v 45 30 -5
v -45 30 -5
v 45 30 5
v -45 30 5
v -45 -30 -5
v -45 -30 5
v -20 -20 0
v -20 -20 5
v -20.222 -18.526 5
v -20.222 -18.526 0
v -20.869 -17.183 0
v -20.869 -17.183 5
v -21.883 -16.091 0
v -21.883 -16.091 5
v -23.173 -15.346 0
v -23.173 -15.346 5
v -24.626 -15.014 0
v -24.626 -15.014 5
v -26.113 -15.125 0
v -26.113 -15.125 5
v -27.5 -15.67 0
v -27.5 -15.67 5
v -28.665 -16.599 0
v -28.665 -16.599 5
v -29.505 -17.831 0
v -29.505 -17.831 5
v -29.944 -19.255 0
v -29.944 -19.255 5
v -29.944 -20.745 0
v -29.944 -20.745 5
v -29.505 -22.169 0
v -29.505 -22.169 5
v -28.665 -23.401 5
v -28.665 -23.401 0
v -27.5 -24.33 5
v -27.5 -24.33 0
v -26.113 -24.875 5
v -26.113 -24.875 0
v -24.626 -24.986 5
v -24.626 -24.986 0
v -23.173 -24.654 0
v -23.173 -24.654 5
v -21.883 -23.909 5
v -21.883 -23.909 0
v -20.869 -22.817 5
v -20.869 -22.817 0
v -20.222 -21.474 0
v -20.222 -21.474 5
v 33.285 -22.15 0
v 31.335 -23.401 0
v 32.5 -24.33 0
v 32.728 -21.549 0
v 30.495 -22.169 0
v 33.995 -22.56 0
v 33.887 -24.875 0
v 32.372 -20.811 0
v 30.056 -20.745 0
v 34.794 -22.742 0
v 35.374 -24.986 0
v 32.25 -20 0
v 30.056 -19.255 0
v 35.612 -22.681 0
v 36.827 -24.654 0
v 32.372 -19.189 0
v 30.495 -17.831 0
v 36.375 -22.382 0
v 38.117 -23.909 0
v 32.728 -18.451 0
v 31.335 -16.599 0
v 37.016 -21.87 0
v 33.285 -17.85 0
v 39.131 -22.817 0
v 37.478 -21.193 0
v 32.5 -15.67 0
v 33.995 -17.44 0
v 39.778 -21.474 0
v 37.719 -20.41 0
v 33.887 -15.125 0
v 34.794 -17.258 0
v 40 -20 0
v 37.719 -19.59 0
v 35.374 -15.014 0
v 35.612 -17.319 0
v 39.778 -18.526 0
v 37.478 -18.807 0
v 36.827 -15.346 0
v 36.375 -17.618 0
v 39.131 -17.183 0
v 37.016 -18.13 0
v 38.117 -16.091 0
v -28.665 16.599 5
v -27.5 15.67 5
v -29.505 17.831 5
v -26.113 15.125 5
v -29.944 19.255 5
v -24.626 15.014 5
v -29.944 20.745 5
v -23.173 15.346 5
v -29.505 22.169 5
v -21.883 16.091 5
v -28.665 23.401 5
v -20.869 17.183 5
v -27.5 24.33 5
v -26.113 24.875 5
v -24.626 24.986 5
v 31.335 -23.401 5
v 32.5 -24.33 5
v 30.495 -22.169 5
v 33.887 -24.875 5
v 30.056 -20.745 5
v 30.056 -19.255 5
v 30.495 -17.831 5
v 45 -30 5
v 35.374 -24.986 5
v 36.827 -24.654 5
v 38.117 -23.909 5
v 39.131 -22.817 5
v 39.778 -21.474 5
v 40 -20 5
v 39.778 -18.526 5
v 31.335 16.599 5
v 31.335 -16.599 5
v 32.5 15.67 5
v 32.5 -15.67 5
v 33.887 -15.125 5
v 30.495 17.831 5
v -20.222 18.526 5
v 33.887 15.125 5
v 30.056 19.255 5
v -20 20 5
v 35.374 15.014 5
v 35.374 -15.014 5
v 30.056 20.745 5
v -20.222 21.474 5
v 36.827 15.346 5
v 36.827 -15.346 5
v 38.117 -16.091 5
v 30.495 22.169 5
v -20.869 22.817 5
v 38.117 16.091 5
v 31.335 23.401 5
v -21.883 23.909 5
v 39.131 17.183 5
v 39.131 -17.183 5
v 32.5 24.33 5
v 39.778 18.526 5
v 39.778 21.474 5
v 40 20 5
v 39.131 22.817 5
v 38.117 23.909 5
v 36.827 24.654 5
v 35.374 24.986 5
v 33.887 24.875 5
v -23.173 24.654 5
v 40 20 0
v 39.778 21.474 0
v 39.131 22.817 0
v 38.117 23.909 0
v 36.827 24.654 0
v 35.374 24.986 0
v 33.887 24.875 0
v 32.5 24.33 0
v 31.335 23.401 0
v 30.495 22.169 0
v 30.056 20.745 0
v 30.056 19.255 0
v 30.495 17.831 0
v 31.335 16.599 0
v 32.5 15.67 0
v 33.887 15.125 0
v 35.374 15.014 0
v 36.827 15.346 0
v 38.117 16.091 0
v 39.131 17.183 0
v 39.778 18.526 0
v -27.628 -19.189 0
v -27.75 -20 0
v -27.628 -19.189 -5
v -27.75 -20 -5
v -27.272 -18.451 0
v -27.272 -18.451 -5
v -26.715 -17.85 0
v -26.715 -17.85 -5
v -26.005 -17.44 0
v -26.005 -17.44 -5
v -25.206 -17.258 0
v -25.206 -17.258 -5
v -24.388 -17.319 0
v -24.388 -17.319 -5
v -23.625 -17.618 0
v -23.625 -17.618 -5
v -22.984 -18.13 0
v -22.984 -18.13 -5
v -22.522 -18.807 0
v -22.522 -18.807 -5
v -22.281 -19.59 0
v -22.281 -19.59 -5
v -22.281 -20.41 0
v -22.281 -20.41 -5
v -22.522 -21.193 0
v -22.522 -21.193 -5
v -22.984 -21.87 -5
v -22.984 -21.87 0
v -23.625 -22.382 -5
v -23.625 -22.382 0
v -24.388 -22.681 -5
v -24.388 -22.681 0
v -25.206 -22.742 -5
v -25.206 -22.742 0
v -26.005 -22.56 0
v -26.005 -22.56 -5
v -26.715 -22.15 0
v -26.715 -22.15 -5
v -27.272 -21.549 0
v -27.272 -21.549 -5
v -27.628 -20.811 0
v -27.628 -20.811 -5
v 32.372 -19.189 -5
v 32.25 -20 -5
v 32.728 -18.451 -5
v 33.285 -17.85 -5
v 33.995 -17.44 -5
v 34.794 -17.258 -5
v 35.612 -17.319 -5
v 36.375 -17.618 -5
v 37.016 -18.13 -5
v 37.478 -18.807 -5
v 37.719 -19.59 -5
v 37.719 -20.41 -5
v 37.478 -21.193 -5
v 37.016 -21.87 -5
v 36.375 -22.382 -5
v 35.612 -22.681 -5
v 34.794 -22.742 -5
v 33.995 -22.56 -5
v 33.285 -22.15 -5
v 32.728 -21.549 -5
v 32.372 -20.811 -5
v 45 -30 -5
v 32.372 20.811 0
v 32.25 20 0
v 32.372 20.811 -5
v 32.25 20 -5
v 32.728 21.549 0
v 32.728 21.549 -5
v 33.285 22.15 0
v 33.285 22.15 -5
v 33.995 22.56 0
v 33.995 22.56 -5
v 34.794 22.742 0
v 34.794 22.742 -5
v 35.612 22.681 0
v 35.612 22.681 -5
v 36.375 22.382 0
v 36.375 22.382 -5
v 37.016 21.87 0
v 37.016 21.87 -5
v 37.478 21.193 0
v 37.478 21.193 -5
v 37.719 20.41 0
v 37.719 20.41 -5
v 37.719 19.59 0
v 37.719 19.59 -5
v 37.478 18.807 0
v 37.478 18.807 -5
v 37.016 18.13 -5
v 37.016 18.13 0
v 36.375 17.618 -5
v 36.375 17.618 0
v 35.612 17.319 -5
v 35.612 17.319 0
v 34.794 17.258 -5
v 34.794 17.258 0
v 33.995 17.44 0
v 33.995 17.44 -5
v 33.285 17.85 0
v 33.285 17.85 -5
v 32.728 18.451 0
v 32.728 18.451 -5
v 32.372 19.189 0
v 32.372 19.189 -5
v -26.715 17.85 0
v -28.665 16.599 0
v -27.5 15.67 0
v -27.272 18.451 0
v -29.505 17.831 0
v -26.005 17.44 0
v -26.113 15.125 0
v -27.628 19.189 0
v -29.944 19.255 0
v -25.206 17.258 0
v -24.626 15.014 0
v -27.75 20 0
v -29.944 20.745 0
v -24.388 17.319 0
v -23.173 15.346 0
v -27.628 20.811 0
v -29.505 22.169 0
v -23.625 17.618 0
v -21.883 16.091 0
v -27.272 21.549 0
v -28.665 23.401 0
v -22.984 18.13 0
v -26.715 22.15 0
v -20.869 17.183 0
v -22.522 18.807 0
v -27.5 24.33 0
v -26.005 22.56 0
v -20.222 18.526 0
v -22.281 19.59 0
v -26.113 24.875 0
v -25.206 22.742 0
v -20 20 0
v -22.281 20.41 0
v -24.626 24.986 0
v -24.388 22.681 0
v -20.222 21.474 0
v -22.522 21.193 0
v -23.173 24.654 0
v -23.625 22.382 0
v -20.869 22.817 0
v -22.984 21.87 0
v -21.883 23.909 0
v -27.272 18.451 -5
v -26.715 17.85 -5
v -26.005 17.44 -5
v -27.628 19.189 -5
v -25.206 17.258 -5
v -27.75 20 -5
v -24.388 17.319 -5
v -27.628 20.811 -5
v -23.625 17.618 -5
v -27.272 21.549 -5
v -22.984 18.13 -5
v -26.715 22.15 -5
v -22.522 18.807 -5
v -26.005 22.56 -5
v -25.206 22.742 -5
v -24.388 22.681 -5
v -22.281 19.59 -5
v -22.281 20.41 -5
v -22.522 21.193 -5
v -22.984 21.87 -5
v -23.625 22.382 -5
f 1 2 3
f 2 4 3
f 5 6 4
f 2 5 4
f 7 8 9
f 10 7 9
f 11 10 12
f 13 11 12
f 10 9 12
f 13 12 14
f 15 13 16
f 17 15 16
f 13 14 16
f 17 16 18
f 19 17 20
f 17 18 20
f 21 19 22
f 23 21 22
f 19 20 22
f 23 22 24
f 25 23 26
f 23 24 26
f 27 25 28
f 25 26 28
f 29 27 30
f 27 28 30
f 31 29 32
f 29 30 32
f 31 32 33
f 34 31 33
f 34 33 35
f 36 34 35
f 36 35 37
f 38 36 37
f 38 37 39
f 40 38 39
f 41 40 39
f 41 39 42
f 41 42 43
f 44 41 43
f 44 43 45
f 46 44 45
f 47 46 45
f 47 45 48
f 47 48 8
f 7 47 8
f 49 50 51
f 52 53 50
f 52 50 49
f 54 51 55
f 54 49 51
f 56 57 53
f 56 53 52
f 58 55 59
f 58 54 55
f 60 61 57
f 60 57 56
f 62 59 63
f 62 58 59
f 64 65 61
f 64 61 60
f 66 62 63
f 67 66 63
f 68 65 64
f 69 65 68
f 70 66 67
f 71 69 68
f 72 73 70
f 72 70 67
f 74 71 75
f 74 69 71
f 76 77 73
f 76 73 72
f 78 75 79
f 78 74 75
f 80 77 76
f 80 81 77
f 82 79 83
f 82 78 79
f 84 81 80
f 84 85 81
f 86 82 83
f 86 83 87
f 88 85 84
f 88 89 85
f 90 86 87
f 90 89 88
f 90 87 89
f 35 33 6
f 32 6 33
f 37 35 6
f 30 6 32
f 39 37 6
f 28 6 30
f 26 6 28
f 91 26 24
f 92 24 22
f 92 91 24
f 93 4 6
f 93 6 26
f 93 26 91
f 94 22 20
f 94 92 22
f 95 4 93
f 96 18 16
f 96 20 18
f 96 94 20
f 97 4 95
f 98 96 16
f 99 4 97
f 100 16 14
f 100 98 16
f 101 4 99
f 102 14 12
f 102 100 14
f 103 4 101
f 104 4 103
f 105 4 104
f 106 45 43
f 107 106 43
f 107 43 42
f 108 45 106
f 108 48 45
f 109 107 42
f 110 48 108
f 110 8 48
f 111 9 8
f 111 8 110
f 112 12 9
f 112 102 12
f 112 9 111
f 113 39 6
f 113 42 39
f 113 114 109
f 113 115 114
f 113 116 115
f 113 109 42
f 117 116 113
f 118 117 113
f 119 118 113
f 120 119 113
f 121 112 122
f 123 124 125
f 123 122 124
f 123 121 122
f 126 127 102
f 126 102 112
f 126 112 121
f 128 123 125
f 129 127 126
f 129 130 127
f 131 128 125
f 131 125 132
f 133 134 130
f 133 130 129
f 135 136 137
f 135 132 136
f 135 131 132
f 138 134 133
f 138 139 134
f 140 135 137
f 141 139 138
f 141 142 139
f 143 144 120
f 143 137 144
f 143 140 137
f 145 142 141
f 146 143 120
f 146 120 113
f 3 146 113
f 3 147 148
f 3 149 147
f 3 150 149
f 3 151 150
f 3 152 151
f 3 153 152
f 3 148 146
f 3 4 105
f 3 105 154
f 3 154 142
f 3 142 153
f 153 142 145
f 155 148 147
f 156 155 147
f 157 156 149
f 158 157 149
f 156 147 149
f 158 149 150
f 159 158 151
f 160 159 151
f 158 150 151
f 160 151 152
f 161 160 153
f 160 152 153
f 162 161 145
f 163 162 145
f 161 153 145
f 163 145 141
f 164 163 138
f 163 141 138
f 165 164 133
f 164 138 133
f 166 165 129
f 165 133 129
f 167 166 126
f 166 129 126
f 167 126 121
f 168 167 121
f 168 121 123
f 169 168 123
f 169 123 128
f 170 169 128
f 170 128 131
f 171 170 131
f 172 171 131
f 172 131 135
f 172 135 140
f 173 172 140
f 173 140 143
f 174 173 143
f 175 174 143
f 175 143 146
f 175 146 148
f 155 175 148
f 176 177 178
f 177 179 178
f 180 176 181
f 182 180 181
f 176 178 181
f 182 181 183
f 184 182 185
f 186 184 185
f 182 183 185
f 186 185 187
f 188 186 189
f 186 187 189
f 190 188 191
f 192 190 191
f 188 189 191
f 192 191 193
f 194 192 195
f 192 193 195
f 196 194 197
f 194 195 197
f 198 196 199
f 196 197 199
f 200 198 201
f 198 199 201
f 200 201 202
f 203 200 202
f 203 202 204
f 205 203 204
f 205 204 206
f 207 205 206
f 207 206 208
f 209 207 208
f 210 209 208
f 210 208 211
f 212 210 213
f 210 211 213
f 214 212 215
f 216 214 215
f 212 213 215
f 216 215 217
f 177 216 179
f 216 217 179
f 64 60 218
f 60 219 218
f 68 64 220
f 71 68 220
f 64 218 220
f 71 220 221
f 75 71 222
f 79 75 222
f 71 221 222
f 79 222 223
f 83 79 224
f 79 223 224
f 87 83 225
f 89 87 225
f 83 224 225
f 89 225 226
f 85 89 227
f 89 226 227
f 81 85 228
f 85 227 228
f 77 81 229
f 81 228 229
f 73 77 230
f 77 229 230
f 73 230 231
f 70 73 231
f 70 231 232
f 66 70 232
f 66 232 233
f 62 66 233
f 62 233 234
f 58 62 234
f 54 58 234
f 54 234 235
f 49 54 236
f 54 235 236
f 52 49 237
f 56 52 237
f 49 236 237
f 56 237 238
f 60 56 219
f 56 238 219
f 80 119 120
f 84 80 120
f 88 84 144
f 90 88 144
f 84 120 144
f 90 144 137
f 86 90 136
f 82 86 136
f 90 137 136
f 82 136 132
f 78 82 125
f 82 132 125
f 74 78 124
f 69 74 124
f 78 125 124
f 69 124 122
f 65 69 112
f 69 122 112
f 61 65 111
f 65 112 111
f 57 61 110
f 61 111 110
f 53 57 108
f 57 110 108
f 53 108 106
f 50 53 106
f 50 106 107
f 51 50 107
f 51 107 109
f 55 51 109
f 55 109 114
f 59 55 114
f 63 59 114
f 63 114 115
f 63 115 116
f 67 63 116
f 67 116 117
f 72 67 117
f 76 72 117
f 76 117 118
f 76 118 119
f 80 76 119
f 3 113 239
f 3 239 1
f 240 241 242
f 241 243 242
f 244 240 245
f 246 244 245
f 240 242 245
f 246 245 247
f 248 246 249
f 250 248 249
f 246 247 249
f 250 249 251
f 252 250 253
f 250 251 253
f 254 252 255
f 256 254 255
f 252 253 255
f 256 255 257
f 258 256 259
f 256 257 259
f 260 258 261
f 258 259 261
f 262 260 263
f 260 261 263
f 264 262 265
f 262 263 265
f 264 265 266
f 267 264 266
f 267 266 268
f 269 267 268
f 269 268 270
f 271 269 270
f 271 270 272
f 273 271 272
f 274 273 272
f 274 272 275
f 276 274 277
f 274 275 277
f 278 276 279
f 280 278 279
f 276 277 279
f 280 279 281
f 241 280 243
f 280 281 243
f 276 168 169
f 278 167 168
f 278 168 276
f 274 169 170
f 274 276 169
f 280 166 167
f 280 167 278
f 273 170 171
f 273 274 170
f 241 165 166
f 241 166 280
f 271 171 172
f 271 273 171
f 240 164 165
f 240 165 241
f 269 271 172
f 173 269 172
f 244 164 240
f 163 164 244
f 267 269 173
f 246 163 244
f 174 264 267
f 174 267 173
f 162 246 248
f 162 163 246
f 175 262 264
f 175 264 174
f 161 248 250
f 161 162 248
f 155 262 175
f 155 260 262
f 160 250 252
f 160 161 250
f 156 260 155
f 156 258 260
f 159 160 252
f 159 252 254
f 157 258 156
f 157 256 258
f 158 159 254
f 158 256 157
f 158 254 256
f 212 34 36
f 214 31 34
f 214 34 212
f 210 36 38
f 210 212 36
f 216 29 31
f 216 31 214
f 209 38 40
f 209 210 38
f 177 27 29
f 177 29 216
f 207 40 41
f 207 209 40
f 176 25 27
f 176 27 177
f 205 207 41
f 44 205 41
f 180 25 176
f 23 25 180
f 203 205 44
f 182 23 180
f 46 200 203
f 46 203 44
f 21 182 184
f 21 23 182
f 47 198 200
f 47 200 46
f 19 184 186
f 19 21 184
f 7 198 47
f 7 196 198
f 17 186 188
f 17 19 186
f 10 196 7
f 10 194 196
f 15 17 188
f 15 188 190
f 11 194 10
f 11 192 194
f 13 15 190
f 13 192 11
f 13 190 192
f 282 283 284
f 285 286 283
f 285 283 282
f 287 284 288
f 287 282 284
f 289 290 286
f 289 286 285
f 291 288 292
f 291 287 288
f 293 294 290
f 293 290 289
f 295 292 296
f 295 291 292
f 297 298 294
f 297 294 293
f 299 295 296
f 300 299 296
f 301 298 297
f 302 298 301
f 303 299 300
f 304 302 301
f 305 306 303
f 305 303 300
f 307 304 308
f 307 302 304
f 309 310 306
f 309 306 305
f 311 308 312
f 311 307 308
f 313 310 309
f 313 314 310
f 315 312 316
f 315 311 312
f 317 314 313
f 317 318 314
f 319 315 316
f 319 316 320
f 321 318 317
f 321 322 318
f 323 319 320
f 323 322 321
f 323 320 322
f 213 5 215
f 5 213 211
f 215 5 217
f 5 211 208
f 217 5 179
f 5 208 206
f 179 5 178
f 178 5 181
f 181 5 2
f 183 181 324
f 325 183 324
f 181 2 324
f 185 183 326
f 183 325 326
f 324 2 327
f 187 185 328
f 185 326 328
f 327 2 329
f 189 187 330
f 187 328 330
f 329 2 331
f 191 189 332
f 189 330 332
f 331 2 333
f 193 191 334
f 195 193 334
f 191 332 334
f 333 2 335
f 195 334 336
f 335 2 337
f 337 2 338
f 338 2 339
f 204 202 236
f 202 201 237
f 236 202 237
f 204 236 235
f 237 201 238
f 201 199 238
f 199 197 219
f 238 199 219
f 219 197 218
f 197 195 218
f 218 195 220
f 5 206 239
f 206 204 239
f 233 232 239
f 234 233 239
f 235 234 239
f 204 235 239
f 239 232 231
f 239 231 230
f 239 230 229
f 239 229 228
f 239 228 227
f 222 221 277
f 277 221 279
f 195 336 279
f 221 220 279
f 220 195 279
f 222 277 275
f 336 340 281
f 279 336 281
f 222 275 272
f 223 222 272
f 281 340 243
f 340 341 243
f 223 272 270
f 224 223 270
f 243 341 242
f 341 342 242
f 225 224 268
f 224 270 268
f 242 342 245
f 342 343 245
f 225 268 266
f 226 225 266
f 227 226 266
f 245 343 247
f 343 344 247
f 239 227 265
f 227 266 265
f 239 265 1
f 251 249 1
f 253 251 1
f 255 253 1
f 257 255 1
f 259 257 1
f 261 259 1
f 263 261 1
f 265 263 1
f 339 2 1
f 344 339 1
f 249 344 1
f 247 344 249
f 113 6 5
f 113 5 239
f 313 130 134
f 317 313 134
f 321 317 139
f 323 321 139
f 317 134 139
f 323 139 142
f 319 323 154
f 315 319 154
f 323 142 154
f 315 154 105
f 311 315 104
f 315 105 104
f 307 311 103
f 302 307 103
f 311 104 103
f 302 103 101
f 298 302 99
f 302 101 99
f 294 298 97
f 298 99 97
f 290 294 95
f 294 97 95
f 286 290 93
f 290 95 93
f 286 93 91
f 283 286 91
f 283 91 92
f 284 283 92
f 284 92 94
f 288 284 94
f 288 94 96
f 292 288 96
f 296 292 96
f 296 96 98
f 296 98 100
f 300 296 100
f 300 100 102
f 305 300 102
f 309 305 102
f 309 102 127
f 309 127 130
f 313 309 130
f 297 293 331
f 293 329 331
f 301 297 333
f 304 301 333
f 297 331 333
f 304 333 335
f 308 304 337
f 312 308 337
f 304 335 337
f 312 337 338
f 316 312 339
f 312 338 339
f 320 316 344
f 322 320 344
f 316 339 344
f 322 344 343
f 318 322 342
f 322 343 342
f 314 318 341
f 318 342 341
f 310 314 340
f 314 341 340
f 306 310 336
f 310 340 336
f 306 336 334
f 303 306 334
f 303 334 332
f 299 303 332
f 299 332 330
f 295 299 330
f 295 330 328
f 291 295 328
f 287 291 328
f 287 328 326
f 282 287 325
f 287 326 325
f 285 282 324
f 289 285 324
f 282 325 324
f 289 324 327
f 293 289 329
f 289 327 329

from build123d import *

# Parameters (mm, degrees)
SKETCH1_W                      = 90
SKETCH1_H                      = 60
BOSS_EXTRUDE1_DEPTH            = 5
CBORE_FOR_M5_SHCS1_D           = 5.5
CBORE_FOR_M5_SHCS1_CBORE_D     = 10
CBORE_FOR_M5_SHCS1_CBORE_DEPTH = 5
LPATTERN1_COUNT                = 2
LPATTERN1_PITCH                = 60
LPATTERN1_COUNT_DIR2           = 2
LPATTERN1_PITCH_DIR2           = 40


with BuildPart() as part:
    # Sketch1 → Boss-Extrude1 (new body, symmetric)
    with BuildSketch(Plane.XY):
        Rectangle(SKETCH1_W, SKETCH1_H)
    extrude(amount=BOSS_EXTRUDE1_DEPTH, both=True)

    # CBORE for M5 SHCS1 (through all)
    with Locations(Plane.XY.offset(5)):
        with Locations((-25, 20)):
            cbore_for_m5_shcs1 = CounterBoreHole(CBORE_FOR_M5_SHCS1_D / 2, CBORE_FOR_M5_SHCS1_CBORE_D / 2, CBORE_FOR_M5_SHCS1_CBORE_DEPTH)

    # LPattern1: CBORE for M5 SHCS1 2 × 2
    with Locations(*[(i * LPATTERN1_PITCH, -j * LPATTERN1_PITCH_DIR2, 0) for i in range(LPATTERN1_COUNT) for j in range(LPATTERN1_COUNT_DIR2) if (i, j) != (0, 0)]):
        add(cbore_for_m5_shcs1, mode=Mode.SUBTRACT)


solid = part.part
